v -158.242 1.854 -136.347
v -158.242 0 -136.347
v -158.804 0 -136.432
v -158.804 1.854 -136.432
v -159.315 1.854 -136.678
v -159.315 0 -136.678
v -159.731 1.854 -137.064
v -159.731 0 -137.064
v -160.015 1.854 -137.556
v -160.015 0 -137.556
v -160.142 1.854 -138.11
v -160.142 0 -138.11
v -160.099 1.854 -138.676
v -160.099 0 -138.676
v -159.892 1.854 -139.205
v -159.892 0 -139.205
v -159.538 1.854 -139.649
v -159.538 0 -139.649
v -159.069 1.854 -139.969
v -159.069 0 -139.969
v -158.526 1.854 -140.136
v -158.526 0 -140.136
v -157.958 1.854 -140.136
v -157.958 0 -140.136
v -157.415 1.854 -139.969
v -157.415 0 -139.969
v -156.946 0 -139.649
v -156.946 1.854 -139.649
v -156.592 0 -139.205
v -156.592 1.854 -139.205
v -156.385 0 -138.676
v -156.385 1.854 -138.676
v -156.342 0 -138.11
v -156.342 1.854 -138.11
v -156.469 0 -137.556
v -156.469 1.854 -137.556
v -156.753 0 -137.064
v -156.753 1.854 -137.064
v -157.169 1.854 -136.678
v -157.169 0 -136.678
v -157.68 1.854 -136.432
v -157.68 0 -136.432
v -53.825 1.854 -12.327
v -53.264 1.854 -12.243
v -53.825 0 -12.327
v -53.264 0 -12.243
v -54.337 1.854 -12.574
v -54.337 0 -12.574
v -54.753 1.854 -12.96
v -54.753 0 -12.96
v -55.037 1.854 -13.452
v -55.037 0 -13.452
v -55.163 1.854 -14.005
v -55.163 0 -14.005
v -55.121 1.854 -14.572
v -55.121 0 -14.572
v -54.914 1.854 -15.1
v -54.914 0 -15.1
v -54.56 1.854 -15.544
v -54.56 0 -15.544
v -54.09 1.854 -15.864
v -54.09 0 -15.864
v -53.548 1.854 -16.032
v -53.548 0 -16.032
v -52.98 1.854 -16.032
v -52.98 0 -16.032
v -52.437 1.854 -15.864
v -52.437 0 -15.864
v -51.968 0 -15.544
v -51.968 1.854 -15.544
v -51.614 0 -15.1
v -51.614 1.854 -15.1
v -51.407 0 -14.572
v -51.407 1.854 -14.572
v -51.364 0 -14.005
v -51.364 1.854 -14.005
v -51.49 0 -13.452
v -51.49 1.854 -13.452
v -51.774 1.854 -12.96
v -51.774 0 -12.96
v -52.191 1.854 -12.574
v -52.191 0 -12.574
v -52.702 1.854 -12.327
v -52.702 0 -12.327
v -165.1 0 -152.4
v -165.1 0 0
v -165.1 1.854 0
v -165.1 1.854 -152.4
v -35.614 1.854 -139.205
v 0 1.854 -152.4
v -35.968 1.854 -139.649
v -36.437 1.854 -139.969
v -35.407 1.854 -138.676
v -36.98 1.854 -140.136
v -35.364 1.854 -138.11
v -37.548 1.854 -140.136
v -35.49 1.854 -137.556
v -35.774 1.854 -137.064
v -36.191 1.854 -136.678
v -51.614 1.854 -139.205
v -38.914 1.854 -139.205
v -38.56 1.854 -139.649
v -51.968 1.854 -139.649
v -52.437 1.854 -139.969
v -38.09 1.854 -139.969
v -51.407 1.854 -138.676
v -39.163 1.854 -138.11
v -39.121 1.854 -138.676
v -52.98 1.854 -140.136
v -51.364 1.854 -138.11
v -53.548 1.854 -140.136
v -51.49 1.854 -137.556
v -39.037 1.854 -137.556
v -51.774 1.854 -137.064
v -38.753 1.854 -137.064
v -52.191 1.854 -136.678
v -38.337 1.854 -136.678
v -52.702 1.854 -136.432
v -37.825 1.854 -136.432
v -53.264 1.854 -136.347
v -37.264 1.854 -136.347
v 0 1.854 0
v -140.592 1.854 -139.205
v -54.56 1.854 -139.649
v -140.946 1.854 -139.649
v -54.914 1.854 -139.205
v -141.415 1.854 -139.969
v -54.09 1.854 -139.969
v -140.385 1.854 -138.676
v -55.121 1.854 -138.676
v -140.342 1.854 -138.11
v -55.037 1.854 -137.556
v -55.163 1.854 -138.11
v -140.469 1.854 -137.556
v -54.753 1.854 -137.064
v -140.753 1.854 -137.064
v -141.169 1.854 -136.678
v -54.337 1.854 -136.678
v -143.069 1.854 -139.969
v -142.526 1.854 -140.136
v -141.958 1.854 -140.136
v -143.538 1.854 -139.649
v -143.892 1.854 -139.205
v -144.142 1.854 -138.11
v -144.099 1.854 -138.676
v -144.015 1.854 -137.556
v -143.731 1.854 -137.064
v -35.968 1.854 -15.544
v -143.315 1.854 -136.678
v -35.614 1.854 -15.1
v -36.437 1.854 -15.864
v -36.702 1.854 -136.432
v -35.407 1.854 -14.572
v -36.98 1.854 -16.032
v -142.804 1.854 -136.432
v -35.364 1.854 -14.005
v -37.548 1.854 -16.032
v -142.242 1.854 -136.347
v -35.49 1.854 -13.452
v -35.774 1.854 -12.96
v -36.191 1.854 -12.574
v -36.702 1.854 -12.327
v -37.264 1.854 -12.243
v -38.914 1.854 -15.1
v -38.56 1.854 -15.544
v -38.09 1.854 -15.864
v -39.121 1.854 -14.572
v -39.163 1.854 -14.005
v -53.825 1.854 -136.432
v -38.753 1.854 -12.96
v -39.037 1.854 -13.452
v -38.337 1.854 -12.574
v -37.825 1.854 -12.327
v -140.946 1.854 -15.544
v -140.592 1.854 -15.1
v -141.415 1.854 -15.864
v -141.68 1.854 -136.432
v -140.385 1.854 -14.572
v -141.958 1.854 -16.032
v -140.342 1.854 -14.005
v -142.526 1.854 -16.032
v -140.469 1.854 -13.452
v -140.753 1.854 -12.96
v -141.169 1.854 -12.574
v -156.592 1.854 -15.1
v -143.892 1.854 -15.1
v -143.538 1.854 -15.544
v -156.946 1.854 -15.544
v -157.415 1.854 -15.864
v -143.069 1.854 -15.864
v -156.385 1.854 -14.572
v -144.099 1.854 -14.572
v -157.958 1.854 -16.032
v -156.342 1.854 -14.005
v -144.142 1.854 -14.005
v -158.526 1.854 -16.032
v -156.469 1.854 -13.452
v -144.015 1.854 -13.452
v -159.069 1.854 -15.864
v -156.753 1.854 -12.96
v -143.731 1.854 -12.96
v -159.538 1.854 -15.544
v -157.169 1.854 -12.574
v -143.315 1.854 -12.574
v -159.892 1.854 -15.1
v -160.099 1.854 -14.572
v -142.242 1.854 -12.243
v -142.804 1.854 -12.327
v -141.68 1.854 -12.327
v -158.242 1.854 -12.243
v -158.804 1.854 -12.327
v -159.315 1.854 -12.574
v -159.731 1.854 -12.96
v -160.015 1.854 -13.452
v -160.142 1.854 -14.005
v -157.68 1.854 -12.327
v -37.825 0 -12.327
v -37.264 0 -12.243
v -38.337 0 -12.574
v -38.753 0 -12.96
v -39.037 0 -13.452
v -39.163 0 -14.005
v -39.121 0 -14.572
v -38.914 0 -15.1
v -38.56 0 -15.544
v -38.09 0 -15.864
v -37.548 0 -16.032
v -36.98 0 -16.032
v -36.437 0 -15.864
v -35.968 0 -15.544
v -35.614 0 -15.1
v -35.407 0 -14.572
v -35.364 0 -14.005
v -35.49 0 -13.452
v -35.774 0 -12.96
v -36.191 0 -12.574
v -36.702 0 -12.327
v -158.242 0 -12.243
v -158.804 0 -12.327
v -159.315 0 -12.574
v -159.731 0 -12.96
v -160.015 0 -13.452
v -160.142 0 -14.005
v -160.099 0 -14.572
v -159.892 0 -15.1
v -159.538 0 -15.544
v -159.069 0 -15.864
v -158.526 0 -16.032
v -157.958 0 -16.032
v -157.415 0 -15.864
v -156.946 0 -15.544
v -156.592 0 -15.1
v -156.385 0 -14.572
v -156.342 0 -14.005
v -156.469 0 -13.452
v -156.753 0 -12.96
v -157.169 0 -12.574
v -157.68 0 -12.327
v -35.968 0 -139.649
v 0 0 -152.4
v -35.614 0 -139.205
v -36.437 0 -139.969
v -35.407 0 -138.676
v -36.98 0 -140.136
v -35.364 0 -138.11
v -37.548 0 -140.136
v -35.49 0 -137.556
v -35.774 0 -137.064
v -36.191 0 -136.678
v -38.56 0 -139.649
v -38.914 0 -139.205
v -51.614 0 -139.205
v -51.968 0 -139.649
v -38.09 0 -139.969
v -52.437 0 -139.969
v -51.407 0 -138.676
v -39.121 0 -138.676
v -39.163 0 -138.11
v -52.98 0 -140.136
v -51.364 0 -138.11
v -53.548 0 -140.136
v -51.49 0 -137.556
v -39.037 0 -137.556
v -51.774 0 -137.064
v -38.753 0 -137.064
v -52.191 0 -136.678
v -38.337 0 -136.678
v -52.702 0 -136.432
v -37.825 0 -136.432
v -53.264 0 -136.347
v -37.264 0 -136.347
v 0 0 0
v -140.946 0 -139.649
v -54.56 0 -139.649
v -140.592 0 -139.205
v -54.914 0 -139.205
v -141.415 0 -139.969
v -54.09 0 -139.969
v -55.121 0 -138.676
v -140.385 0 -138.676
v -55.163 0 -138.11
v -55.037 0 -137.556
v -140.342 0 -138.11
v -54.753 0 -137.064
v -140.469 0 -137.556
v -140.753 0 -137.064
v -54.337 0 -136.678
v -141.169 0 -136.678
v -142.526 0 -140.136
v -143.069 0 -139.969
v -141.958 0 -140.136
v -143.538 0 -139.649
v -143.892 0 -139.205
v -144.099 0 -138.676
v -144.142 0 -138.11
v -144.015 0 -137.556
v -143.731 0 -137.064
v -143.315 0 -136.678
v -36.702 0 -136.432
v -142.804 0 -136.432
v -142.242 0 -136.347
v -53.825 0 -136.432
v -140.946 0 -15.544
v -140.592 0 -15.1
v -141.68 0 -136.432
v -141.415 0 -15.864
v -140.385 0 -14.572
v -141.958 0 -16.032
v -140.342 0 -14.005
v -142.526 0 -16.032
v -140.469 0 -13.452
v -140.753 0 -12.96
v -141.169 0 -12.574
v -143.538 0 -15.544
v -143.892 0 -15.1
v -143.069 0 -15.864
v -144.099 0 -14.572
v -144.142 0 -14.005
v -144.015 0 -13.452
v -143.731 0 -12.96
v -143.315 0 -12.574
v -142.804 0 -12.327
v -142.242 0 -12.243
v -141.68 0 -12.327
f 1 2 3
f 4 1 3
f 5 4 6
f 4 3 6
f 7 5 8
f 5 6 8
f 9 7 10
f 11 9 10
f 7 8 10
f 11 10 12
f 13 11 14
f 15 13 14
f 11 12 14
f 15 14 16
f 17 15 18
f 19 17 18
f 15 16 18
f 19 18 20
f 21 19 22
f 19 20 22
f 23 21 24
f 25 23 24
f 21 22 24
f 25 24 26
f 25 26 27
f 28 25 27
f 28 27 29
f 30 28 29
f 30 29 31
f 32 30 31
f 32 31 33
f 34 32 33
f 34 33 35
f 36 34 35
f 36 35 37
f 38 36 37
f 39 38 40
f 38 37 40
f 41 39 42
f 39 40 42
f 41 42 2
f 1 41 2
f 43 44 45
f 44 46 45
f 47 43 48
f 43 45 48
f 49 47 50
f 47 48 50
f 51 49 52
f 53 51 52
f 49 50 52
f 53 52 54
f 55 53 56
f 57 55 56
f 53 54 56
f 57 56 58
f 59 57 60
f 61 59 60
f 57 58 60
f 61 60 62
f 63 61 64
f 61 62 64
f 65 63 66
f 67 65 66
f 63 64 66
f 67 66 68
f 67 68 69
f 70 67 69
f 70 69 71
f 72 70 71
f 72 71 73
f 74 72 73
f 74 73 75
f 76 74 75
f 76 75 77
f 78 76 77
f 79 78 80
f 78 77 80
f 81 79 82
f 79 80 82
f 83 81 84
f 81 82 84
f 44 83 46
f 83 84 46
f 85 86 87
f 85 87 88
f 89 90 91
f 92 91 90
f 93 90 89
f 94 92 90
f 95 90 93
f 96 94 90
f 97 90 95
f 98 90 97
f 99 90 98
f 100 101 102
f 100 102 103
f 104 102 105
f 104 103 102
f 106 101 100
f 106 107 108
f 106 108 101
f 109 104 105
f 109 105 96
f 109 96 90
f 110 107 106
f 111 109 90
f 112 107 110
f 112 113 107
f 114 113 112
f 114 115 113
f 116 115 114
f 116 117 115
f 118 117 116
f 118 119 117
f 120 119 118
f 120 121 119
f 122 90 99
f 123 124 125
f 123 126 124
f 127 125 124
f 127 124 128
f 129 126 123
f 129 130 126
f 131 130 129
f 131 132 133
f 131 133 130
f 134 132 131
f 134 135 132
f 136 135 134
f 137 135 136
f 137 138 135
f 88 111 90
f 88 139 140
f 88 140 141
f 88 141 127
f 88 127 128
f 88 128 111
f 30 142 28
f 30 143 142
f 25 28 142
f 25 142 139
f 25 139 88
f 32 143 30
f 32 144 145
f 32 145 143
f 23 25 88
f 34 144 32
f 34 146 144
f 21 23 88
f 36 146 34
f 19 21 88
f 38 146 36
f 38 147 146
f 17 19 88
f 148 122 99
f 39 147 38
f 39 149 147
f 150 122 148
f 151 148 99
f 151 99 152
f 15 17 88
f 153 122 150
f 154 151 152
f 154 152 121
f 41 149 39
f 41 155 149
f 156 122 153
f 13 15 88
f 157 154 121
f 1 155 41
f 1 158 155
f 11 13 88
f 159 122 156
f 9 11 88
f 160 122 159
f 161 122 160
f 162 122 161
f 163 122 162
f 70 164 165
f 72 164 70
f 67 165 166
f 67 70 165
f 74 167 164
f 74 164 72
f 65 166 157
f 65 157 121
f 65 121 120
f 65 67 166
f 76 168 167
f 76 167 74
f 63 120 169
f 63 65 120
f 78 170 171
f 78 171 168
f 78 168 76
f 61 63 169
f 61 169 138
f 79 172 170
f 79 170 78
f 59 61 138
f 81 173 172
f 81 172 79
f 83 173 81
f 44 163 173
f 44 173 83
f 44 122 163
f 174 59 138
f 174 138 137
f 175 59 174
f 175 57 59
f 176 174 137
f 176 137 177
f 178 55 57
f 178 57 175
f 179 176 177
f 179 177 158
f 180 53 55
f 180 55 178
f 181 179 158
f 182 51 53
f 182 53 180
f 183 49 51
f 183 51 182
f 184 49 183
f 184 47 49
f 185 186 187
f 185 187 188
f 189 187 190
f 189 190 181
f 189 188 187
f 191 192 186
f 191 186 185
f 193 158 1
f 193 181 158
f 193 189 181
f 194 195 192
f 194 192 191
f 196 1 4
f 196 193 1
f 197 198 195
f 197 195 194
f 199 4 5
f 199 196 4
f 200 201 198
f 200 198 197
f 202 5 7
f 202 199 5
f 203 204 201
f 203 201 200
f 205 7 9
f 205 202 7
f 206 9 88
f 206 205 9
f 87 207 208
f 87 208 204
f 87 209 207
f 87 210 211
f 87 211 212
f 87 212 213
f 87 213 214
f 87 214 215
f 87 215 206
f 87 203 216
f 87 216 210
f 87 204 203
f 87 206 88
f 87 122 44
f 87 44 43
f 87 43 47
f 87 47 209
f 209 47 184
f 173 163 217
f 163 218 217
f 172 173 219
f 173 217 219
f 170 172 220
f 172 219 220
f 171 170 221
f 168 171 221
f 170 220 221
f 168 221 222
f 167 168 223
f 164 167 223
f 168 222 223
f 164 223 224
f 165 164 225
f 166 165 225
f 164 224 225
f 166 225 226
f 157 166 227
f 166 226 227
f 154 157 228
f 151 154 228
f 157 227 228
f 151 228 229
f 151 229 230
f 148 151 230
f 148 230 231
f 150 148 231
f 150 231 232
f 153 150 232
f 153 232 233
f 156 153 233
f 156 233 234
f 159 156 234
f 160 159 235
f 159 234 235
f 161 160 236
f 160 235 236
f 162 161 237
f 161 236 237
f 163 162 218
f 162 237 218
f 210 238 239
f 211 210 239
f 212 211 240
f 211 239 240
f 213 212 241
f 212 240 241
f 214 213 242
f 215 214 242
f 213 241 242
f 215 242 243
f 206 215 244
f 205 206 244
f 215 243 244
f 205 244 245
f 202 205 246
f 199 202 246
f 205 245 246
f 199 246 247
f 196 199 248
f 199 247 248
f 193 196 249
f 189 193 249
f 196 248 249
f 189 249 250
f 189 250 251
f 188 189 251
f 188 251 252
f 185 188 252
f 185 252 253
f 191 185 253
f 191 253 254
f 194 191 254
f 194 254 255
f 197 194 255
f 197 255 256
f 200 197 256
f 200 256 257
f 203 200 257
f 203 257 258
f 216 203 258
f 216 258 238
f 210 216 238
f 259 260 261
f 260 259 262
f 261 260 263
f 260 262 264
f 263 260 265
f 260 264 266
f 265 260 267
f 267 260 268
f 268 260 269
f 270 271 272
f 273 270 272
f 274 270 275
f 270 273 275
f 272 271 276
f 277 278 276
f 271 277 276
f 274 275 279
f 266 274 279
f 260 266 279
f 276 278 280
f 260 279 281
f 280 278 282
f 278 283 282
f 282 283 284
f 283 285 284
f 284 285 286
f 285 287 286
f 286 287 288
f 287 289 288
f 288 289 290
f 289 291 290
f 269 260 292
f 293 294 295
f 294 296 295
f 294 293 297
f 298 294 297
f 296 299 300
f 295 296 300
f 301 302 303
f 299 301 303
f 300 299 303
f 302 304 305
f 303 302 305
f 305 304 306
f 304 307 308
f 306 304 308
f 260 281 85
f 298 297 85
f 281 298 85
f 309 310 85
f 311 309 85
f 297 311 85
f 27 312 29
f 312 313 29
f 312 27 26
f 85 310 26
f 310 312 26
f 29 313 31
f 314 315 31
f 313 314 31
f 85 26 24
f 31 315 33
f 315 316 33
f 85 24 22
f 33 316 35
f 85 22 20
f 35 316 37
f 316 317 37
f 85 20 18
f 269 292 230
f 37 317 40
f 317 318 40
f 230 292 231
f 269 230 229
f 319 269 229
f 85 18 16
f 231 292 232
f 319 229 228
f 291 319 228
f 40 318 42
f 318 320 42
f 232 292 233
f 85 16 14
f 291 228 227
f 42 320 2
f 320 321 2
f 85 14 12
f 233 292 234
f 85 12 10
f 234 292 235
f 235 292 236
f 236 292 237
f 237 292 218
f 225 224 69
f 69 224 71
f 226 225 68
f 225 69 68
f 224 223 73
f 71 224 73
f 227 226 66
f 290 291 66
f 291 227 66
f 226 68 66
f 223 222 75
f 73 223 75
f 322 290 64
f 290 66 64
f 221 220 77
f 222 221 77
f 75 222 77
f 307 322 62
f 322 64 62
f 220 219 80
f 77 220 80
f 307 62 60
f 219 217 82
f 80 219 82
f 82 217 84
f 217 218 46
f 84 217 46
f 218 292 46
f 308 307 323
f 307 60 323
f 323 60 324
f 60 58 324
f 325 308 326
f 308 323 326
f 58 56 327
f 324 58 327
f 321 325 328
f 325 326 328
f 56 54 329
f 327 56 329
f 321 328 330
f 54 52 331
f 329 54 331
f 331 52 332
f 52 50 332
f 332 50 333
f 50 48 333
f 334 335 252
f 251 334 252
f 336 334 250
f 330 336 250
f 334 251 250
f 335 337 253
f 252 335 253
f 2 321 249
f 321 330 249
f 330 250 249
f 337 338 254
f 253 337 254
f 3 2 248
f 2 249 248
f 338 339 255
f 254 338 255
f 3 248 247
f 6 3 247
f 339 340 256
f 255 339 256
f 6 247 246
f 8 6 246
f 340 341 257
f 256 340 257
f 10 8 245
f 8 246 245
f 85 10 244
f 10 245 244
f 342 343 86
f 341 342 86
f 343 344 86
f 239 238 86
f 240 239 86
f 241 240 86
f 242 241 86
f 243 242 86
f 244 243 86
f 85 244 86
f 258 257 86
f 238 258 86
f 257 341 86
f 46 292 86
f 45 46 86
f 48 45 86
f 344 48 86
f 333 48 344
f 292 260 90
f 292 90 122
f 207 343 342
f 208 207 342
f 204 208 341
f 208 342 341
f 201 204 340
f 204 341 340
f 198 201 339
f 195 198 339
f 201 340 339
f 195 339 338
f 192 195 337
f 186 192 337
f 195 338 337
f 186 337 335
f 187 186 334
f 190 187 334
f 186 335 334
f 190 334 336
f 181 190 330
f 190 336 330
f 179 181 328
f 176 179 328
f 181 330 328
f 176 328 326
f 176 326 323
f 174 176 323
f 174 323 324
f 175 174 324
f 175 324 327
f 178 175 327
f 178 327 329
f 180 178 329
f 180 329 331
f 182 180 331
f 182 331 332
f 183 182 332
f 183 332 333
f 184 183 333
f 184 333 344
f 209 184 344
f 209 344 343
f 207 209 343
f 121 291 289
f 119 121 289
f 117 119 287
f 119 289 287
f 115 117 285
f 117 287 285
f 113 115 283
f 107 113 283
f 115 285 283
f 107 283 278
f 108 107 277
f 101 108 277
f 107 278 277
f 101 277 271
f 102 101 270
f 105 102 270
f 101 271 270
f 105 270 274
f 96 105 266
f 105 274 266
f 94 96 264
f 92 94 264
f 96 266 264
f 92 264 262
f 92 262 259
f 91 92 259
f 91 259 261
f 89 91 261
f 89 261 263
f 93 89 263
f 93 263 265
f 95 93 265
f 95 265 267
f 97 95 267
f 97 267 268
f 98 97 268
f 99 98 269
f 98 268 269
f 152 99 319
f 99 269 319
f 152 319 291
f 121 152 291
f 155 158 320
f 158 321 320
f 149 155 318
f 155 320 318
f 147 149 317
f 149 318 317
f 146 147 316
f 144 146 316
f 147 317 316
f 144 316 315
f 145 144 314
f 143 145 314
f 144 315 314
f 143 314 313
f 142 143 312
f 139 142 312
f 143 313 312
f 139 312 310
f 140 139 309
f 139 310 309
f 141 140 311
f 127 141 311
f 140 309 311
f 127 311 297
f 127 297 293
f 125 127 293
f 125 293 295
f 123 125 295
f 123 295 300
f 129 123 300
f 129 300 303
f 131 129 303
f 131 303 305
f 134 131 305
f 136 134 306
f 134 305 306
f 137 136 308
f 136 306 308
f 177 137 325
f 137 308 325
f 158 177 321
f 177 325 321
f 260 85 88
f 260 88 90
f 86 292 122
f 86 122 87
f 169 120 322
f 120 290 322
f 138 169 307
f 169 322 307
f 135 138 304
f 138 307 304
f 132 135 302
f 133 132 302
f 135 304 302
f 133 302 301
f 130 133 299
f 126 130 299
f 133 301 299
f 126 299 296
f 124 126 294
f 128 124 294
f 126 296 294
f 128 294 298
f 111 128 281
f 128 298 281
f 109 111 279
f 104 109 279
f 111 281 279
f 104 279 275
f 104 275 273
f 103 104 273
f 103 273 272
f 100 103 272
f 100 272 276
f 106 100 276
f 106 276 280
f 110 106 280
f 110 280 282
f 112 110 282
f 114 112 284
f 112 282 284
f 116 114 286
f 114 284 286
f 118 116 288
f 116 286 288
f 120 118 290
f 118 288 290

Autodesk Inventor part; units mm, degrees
ref_plane "YZ Plane" through (0, 0, 0) normal (1, 0, 0) x (0, 1, 0)
ref_plane "XZ Plane" through (0, 0, 0) normal (0, 1, 0) x (-1, 0, 0)
ref_plane "XY Plane" through (0, 0, 0) normal (0, 0, 1) x (1, 0, 0)
sketch "Sketch1" plane through (0, 0, 0) normal (0, 1, 0) x (-1, 0, 0)
  line L0 (0, 0) -> (165.1, 0)
  line L1 (165.1, 0) -> (165.1, -152.4)
  line L2 (165.1, -152.4) -> (0, -152.4)
  line L3 (0, -152.4) -> (0, 0)
  dimension "d0" = 165.1
  dimension "d1" = 152.4
extrude "Extrusion1" add sketch "Sketch1" along normal blind 1.8542
sketch "Sketch2" plane through (0, 1.8542, 0) normal (0, 1, 0) x (1, 0, 0)
  line L0 (-165.1, 0) -> (0, 0) projected
  line L1 (0, 0) -> (0, 152.4) projected
  line L2 (0, 152.4) -> (-165.1, 152.4) projected
  line L3 (-165.1, 152.4) -> (-165.1, 0) projected
  point P0 (-158.242, 14.1478)
  point P1 (-142.242, 14.1478)
  point P2 (-53.2638, 14.1478)
  point P3 (-37.2638, 14.1478)
  point P4 (-37.2638, 138.2522)
  point P5 (-53.2638, 138.2522)
  point P6 (-142.242, 138.2522)
  point P7 (-158.242, 138.2522)
  dimension "d4" = 165.1
  dimension "d5" = 16
  dimension "d6" = 16
  dimension "d7" = 16
  dimension "d8" = 16
  dimension "d9" = 14.1478
  dimension "d10" = 14.1478
  dimension "d11" = 14.1478
  dimension "d12" = 14.1478
  dimension "d13" = 14.1478
  dimension "d14" = 14.1478
  dimension "d15" = 14.1478
  dimension "d16" = 14.1478
  dimension "d17" = 53.2638
  dimension "d18" = 53.2638
  dimension "d19" = 158.242
  dimension "d20" = 158.242
hole "Hole1" at (-158.242, 1.8542, -14.1478) at (-142.242, 1.8542, -14.1478) at (-53.2638, 1.8542, -14.1478) at (-37.2638, 1.8542, -14.1478) at (-37.2638, 1.8542, -138.2522) at (-53.2638, 1.8542, -138.2522) at (-142.242, 1.8542, -138.2522) at (-158.242, 1.8542, -138.2522) direction (0, -1, 0) diameter 3.81 depth 10.9728 tip angle 118
equation "\"d6\" = d5"
equation "\"d7\" = d5"
equation "\"d8\" = d5"
equation "\"d10\" = d9"
equation "\"d11\" = d9"
equation "\"d12\" = d9"
equation "\"d13\" = d9"
equation "\"d14\" = d9"
equation "\"d15\" = d9"
equation "\"d16\" = d9"
equation "\"d18\" = d17"
equation "\"d20\" = d19"
properties part number "PaddleCollectionFloor" material "Polycarbonate, Clear"
